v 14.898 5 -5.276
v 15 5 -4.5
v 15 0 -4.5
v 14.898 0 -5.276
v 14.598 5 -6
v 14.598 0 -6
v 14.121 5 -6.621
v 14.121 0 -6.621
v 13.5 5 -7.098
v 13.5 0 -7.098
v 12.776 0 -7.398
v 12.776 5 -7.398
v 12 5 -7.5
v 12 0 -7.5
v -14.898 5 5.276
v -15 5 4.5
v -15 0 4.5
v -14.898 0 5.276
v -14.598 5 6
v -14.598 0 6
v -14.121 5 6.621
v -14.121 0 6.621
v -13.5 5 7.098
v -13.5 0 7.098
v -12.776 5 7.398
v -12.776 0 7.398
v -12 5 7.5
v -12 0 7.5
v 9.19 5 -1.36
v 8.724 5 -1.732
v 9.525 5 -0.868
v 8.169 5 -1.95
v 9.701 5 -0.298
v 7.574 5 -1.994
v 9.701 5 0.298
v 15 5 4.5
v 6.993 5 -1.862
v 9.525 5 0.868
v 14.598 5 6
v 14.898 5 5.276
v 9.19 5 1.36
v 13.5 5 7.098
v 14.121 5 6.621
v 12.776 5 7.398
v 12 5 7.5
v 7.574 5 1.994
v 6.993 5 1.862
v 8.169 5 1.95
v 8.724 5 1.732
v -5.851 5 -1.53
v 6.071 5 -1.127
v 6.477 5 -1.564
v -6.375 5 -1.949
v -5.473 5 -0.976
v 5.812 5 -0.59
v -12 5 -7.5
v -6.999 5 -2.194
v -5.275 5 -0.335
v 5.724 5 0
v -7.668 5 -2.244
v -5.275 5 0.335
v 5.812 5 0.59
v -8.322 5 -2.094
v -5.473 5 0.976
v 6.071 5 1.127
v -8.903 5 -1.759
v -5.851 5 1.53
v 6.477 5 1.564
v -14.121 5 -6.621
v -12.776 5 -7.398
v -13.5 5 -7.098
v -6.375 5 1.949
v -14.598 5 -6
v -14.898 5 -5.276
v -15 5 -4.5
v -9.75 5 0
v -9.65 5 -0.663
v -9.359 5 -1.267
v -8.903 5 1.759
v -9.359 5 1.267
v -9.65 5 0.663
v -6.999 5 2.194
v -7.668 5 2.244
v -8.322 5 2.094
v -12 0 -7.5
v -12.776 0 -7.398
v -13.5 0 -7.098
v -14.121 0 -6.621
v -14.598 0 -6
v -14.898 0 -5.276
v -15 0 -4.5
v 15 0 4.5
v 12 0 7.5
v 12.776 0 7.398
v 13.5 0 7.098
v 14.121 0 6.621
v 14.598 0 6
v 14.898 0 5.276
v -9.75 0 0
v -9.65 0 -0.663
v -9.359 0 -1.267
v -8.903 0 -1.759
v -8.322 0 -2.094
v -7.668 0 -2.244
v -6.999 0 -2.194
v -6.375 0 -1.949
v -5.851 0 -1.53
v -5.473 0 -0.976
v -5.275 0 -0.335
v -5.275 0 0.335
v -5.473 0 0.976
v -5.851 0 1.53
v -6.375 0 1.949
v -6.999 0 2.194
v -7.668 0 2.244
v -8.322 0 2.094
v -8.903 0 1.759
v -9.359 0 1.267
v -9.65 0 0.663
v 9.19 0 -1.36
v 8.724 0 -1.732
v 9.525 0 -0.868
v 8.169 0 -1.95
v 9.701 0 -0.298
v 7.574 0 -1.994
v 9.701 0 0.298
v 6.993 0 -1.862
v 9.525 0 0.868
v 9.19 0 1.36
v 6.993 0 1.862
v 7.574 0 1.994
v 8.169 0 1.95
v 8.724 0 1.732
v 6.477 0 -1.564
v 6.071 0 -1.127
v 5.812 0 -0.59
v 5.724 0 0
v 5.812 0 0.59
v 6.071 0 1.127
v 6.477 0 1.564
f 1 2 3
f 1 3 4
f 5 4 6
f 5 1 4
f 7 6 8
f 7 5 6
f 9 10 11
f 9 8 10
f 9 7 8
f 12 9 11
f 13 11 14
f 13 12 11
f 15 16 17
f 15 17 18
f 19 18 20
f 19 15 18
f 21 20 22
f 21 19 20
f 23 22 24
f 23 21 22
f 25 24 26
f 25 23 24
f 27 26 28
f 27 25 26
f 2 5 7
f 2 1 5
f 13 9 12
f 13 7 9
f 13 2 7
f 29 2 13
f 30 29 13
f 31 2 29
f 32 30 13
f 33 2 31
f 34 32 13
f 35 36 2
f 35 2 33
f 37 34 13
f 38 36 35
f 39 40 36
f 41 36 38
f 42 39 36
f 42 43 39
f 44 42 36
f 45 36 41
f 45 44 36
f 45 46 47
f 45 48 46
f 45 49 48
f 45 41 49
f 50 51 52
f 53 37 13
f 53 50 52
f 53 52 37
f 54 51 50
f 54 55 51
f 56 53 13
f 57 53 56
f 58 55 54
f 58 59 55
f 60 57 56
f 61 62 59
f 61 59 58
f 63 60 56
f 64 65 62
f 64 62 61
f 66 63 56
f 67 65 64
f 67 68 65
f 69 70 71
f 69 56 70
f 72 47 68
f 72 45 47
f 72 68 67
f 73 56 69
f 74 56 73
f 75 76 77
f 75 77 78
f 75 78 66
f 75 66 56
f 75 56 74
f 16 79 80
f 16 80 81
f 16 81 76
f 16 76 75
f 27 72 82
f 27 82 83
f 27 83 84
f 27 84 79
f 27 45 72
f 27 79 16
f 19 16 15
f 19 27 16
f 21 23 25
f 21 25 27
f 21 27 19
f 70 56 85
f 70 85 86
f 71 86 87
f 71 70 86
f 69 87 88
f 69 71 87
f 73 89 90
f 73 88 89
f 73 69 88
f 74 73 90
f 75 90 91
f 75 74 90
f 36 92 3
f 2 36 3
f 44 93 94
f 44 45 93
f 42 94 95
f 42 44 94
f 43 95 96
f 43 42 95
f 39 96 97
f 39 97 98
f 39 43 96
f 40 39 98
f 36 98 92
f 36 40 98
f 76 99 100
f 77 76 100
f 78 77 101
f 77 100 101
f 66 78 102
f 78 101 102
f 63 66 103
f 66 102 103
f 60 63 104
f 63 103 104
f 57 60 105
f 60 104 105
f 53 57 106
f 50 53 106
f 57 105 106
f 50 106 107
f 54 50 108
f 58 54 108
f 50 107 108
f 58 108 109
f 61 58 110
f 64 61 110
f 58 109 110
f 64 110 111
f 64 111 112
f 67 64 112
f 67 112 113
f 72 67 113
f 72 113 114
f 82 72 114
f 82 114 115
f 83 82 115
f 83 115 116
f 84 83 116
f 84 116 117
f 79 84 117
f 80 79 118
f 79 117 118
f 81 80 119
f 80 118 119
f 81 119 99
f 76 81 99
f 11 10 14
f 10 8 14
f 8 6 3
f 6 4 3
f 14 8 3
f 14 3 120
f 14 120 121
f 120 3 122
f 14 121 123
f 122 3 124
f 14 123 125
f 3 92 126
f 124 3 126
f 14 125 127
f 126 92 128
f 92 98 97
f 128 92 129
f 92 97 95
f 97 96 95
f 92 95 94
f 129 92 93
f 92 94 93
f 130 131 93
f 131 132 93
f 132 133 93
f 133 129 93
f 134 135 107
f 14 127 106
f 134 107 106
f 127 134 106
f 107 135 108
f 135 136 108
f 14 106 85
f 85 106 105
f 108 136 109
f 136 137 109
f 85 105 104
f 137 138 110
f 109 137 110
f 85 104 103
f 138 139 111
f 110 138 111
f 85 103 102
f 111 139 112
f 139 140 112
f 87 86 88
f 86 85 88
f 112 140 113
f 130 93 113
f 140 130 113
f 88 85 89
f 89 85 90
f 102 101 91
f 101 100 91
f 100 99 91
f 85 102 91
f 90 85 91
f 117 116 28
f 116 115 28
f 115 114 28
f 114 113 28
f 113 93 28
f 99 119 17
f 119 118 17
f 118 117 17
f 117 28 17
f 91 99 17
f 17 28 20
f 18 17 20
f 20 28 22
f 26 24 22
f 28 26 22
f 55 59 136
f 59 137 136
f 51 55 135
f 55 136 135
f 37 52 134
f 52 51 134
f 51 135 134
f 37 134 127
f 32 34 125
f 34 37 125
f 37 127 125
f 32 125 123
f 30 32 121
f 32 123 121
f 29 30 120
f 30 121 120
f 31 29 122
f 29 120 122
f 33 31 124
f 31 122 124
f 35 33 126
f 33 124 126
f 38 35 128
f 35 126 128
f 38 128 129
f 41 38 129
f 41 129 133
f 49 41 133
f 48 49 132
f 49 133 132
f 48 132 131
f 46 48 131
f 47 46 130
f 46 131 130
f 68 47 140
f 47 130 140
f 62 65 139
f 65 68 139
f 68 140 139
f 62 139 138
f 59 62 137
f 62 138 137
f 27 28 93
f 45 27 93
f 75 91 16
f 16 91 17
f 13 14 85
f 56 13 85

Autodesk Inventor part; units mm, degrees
ref_plane "YZ Plane" through (0, 0, 0) normal (1, 0, 0) x (0, 1, 0)
ref_plane "XZ Plane" through (0, 0, 0) normal (0, 1, 0) x (-1, 0, 0)
ref_plane "XY Plane" through (0, 0, 0) normal (0, 0, 1) x (1, 0, 0)
sketch "Sketch1" plane through (0, 0, 0) normal (0, 1, 0) x (-1, 0, 0)
  line L0 (15, 7.5) -> (-15, 7.5)
  line L1 (-15, 7.5) -> (-15, -7.5)
  line L2 (-15, -7.5) -> (15, -7.5)
  line L3 (15, -7.5) -> (15, 7.5)
  line L4 (15, 7.5) -> (-15, -7.5) construction
  line L5 (-15, 7.5) -> (15, -7.5) construction
  line L6 (0, 7.5) -> (0, -7.5)
  line L7 (15, 0) -> (0, 0)
  circle A0 centre (7.5, 0) radius 2.25
  circle A1 centre (-7.7235, 0) radius 2
  dimension "d0" = 30
  dimension "d1" = 15
  dimension "d2" = 4.5
  dimension "d11" = 4
extrude "Extrusion1" add sketch "Sketch1" along normal blind 5 contours L3 L7 A0 L6 L0 | L6 L2 L1 L0 | L3 L2 L6 L7 A0
fillet "Fillet1" radius 3 4 edges at (-15, 2.5, 7.5) (-15, 2.5, -7.5) (15, 2.5, 7.5) (15, 2.5, -7.5)
properties part number "angulo"
